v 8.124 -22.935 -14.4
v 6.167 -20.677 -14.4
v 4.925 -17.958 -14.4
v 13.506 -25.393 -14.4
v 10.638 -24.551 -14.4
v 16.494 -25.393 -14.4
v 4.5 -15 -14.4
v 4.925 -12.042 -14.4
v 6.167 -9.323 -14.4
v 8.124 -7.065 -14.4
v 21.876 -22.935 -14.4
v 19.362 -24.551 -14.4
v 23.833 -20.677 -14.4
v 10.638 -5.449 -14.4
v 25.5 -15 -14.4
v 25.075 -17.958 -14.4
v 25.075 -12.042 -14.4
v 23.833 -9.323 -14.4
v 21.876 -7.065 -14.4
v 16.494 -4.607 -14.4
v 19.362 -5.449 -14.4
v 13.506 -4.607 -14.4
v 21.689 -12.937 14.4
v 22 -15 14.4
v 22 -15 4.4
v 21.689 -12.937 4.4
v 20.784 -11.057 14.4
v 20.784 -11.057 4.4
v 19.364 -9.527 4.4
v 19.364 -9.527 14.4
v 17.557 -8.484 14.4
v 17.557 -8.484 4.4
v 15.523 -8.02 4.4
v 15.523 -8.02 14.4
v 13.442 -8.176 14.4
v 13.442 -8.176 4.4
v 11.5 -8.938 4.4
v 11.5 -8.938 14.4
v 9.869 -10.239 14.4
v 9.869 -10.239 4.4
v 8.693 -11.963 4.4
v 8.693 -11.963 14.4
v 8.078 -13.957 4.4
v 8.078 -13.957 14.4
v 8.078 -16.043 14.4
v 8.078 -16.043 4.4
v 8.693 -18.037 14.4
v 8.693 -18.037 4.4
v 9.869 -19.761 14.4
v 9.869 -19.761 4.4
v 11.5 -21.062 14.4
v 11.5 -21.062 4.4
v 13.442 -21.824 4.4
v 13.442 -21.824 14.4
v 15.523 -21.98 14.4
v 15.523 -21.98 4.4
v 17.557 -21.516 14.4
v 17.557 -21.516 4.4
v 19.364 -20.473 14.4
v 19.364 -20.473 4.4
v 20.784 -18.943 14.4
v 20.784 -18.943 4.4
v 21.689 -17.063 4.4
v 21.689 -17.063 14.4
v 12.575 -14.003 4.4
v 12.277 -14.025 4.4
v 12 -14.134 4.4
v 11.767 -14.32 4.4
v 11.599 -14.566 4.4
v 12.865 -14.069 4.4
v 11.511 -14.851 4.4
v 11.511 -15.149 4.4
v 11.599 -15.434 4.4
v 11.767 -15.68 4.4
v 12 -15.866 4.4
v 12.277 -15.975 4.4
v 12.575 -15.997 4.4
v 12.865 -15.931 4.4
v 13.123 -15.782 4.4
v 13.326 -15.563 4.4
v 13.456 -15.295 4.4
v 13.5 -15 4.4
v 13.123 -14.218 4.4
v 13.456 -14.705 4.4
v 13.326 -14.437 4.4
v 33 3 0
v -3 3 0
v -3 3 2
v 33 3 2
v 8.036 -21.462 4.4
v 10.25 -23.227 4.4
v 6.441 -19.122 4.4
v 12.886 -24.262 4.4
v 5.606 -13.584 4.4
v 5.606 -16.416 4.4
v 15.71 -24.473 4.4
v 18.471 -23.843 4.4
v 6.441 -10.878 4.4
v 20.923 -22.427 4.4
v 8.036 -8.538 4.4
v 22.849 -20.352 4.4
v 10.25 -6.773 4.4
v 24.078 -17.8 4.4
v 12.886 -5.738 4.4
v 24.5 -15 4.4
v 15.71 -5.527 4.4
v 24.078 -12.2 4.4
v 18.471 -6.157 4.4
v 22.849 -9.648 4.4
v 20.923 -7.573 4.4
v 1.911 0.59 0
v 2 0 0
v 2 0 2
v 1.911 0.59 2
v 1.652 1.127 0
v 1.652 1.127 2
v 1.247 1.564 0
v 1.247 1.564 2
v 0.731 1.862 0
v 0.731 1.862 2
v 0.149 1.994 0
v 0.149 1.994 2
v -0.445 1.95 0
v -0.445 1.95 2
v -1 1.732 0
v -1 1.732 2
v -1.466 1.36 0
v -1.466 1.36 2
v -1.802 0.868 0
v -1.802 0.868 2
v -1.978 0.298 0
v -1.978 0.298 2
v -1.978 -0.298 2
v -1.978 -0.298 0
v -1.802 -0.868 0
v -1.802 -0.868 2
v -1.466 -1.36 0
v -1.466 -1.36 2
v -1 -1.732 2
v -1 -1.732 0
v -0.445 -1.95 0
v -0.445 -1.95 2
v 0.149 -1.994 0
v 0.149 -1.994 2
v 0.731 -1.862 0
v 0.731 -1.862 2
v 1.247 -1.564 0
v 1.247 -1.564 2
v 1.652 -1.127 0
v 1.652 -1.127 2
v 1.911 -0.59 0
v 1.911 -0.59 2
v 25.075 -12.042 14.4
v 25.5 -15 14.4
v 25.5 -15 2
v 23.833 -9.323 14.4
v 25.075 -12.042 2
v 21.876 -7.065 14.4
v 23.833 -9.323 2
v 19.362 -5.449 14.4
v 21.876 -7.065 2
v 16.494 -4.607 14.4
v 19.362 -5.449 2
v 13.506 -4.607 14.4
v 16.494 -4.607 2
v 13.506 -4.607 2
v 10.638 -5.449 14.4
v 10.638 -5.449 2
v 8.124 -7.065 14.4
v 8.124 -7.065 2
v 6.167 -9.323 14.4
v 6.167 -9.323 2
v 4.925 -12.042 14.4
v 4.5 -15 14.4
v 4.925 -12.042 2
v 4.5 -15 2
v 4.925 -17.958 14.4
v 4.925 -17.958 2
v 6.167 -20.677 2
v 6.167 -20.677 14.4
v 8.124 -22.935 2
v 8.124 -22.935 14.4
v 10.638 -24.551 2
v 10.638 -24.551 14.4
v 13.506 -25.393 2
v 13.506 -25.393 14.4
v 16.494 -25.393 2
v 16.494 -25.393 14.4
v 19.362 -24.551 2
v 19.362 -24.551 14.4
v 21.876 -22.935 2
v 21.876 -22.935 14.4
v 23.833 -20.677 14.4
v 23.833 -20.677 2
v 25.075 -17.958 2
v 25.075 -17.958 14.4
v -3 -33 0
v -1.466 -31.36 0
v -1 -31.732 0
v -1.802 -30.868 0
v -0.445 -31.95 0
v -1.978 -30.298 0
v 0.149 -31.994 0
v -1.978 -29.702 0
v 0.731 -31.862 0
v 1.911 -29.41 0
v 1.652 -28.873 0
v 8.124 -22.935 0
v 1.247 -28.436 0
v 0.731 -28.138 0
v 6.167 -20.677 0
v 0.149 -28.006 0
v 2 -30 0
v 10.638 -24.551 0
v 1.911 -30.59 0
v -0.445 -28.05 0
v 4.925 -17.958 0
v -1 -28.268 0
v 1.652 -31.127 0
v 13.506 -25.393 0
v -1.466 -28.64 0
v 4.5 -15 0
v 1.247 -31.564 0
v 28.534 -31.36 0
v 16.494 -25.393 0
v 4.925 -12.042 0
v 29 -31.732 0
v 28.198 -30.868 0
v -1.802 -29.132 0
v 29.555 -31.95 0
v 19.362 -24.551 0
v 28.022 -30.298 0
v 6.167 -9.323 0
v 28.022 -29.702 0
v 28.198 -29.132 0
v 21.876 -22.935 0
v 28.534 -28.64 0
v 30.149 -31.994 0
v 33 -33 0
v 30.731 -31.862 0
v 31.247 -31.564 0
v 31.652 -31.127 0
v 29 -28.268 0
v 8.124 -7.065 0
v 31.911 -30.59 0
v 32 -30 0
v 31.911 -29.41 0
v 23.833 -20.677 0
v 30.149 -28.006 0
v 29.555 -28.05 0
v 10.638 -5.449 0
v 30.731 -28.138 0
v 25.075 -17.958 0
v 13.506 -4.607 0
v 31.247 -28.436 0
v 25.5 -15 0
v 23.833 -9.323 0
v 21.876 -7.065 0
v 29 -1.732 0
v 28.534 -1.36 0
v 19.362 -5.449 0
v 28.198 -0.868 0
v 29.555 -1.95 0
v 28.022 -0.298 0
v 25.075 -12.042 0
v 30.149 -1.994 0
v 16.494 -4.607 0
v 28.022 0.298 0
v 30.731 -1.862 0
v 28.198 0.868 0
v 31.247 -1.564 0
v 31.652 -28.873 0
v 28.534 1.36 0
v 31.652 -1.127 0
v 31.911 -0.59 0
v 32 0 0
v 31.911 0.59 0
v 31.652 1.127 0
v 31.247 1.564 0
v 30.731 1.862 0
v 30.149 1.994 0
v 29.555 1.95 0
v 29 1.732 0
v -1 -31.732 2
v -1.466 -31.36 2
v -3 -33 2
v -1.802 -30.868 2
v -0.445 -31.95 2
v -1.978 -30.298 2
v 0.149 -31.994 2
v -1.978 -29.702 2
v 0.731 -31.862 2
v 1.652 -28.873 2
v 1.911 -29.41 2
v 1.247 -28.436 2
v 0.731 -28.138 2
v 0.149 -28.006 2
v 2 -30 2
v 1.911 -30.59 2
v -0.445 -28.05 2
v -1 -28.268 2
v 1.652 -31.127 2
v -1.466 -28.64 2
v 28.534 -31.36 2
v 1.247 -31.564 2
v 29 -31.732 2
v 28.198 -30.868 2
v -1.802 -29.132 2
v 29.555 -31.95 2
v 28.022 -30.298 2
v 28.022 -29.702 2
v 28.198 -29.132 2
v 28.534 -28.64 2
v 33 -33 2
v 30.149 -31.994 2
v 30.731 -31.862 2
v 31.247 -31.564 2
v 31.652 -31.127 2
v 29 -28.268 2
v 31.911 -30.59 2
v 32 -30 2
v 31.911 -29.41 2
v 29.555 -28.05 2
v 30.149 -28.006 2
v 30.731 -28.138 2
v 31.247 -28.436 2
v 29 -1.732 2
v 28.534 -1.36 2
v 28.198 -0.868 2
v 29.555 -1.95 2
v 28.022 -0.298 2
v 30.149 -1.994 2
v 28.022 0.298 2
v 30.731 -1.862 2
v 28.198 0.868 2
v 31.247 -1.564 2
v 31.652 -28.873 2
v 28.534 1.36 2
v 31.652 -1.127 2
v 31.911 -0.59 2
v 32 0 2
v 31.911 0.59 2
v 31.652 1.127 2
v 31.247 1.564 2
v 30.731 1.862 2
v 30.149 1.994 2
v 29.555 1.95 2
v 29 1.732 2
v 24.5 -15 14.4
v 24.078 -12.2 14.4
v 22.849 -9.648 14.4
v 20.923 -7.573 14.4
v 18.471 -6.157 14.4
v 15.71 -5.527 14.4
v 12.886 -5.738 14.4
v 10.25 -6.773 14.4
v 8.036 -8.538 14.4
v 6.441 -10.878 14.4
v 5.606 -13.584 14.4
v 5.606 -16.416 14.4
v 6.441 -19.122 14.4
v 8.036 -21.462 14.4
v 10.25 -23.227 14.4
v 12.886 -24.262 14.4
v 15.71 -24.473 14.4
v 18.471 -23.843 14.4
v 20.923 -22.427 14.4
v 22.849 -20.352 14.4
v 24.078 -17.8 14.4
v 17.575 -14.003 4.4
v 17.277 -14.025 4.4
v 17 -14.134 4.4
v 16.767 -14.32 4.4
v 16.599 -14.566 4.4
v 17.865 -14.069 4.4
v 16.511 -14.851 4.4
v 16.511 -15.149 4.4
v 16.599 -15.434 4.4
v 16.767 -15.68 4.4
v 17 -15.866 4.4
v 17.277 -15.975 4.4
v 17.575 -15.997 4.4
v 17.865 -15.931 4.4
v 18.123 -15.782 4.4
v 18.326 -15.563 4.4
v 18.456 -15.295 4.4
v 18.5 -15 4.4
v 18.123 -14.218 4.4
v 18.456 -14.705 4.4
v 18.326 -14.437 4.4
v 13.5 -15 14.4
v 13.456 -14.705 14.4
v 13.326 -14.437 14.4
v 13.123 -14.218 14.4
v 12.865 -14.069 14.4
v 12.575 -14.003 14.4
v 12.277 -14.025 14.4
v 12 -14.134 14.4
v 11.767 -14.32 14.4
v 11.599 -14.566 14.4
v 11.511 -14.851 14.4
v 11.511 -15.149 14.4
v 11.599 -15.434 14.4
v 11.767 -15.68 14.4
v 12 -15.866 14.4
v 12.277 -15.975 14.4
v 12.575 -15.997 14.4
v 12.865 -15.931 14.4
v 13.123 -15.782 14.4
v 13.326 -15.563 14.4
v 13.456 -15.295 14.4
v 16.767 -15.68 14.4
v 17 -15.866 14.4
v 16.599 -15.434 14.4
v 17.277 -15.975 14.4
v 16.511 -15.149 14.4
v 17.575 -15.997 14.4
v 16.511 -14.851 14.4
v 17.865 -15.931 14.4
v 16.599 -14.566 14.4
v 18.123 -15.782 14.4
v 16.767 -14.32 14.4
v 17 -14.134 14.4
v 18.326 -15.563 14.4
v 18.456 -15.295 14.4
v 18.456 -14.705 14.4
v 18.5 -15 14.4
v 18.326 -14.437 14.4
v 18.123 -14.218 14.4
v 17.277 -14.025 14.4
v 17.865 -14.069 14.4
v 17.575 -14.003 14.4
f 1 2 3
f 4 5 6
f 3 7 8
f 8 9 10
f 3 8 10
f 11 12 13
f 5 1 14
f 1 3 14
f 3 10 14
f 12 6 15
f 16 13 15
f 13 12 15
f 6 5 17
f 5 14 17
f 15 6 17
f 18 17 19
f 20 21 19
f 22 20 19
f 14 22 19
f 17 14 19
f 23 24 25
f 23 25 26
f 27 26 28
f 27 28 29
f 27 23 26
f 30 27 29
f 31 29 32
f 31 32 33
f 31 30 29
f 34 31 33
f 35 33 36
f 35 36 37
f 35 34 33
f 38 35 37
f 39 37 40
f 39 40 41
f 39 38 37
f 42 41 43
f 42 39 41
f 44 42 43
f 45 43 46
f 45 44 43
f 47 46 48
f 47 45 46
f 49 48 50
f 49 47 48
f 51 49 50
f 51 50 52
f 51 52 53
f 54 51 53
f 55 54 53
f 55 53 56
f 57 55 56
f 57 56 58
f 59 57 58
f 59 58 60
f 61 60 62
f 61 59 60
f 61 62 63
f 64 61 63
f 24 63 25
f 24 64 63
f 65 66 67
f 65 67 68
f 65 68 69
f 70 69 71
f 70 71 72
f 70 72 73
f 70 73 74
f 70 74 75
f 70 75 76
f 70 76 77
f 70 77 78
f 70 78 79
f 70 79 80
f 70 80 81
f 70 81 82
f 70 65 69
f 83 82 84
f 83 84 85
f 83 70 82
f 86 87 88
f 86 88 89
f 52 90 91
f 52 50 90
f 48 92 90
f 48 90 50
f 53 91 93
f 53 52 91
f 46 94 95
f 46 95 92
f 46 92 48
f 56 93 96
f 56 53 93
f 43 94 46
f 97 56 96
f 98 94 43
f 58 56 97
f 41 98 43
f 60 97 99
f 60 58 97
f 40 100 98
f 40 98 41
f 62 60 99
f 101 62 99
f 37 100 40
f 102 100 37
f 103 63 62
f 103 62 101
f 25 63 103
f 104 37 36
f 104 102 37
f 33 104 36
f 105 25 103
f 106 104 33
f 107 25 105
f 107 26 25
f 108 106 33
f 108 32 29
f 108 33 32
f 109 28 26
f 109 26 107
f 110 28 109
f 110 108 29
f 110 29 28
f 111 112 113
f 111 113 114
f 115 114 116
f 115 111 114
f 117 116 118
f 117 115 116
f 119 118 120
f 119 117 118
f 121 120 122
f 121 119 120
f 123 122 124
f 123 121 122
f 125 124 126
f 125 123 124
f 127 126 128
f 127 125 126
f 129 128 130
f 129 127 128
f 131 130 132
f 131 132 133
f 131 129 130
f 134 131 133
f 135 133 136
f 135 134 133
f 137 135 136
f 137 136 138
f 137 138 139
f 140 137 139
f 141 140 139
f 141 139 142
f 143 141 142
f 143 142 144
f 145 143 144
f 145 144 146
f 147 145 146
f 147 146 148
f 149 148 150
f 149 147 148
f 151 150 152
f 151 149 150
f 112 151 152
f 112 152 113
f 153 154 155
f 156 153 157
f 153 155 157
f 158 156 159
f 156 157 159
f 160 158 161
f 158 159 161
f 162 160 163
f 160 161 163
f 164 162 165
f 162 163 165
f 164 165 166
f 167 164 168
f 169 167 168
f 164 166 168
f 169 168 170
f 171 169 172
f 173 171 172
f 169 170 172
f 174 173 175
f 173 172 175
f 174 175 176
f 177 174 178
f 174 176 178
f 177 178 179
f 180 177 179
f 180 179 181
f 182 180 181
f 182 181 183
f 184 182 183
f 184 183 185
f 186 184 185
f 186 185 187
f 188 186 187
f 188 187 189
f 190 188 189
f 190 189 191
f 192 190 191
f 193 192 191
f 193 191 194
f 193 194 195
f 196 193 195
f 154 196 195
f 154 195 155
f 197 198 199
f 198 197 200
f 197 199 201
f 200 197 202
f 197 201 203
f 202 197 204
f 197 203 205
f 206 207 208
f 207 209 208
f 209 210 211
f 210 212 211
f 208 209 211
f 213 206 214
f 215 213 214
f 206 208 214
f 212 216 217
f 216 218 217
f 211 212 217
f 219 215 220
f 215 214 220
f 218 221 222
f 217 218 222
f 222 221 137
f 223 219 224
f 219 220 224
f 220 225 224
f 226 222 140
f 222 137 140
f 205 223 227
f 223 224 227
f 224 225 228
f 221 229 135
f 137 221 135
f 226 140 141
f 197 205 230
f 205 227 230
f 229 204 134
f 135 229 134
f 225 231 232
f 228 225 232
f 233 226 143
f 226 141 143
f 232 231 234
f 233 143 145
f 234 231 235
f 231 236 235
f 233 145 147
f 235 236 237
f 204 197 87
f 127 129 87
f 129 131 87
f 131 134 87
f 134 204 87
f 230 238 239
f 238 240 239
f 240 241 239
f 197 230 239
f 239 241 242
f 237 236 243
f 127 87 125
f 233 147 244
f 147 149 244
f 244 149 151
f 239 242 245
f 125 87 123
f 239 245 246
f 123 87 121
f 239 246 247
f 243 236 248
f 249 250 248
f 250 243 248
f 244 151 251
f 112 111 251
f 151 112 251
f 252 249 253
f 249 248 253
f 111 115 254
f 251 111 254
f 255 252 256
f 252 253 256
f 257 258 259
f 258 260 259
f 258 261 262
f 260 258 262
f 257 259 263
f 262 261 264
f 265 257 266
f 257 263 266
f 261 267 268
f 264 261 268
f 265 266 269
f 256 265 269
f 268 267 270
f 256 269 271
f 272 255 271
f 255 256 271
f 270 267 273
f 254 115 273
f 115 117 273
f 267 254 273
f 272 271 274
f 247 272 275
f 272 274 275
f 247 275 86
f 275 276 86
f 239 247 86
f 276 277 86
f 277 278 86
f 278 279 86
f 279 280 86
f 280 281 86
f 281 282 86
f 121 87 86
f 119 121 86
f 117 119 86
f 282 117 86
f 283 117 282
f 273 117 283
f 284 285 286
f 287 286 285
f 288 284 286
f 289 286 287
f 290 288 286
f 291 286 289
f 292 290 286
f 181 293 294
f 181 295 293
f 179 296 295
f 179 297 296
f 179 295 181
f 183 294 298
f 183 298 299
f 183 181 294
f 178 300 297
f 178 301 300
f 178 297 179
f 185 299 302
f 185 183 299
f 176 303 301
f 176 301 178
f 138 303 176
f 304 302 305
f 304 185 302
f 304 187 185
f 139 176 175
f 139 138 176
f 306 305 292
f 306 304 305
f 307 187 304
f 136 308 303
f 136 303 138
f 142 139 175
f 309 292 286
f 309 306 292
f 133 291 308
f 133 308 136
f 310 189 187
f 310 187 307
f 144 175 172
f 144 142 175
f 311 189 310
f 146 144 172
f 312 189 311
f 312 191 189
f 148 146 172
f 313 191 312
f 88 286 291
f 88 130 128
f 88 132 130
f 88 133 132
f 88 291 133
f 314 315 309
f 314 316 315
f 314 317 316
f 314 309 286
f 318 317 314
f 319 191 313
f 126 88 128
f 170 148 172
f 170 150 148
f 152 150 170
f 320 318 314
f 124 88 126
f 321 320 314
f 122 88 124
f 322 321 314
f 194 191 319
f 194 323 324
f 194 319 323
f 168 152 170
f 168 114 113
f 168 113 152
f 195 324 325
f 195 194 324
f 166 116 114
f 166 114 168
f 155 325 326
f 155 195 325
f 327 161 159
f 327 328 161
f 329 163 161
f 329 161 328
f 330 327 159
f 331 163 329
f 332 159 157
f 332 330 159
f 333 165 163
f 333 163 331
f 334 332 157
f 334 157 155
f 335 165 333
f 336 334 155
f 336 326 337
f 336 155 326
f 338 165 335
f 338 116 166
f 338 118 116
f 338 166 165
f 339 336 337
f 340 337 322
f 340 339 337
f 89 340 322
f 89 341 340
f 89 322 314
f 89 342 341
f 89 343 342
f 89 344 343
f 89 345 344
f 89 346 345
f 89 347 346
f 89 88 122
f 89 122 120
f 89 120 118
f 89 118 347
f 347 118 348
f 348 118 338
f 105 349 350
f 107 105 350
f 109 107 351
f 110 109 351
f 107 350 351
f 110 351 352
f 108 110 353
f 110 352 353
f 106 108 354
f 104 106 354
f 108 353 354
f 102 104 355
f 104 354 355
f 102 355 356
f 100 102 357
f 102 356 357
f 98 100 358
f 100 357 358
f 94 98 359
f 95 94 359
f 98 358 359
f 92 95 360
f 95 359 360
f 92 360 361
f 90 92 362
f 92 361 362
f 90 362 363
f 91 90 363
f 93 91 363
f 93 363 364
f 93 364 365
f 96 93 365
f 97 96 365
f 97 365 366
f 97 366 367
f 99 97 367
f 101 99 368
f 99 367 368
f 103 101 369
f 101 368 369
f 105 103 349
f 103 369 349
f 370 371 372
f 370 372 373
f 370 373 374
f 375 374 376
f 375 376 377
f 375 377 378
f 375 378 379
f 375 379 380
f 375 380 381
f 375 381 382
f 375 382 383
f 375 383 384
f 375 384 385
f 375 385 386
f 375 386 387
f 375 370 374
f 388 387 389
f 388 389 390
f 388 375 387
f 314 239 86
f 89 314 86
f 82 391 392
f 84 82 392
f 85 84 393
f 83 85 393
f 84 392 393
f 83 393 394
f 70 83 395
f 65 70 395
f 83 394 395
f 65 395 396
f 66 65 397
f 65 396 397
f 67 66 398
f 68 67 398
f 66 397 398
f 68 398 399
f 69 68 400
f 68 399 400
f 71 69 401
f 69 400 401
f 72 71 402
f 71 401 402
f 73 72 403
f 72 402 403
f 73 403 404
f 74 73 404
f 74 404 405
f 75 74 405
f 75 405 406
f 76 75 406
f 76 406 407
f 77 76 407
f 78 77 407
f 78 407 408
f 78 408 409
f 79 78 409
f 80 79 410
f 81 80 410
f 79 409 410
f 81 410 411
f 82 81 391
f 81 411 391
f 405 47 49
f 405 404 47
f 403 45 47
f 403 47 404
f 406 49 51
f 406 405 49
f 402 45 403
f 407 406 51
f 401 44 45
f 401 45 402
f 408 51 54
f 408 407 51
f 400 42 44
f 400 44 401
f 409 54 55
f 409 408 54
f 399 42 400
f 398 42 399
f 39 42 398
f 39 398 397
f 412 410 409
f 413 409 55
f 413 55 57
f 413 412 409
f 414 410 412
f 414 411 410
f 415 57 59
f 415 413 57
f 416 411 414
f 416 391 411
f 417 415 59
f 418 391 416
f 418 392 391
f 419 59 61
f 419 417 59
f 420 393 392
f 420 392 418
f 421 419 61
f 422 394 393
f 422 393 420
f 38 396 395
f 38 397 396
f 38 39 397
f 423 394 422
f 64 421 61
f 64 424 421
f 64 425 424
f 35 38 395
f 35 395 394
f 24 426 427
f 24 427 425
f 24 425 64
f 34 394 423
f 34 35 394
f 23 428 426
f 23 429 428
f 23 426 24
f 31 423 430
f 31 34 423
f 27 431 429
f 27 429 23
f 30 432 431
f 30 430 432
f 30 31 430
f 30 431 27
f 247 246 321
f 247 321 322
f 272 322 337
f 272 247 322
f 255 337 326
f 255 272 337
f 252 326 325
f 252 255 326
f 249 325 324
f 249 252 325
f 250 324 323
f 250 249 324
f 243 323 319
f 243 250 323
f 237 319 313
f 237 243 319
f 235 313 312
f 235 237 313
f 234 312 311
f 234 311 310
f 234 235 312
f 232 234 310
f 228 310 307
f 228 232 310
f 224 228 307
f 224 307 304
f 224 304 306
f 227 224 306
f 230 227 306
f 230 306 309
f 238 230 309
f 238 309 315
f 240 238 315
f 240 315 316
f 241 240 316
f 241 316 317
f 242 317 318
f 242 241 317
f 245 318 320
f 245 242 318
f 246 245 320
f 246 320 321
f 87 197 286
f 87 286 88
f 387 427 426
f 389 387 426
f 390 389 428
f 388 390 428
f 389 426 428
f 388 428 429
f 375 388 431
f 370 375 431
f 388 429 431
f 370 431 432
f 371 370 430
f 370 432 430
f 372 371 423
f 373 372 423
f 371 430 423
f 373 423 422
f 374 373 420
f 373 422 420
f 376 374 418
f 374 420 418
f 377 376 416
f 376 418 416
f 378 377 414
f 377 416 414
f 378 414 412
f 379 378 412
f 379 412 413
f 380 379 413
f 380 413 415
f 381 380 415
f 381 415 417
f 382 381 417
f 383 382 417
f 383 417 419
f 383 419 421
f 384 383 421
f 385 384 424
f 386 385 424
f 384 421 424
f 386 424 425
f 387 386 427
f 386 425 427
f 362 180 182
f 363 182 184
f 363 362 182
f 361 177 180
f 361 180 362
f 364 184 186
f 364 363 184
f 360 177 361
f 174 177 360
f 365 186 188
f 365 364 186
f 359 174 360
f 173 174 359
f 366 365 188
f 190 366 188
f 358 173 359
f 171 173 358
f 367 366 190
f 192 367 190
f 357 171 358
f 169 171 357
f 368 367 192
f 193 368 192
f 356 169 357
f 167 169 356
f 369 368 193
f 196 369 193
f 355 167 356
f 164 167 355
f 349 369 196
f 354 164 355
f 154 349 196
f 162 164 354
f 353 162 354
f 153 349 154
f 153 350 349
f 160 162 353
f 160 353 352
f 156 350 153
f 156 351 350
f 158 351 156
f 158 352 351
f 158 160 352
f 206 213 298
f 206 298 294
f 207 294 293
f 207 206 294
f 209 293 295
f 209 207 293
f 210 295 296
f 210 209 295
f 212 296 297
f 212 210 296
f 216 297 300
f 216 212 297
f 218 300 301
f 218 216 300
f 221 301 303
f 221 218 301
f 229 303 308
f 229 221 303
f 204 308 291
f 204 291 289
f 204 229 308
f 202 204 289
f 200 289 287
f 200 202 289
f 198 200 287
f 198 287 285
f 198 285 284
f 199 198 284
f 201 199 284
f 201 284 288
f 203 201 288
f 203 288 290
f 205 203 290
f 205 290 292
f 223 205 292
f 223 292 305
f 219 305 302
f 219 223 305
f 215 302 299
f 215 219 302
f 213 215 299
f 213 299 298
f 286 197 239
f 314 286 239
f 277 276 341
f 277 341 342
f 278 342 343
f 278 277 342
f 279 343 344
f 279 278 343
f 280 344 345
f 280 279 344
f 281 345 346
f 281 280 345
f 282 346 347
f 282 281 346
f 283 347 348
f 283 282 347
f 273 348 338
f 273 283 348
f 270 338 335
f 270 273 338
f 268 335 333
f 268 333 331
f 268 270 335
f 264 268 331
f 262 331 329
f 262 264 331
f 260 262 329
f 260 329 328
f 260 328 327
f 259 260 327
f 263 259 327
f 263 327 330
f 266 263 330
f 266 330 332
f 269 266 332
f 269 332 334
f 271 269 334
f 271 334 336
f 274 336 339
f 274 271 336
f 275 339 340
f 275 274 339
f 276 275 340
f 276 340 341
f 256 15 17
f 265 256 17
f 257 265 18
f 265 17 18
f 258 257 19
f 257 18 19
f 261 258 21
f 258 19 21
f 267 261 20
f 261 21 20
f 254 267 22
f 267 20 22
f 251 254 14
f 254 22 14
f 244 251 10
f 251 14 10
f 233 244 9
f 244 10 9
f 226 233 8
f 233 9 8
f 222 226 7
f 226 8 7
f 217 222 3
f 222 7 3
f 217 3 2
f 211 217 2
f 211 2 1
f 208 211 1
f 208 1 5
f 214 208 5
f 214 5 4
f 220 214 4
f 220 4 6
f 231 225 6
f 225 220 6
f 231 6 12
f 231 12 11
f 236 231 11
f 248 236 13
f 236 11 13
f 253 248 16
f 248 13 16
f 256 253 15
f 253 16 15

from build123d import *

# Parameters (mm, degrees)
SKETCH_1_W           = 36
SKETCH_1_H           = 36
SKETCH_1_R           = 2
EXTRUDE_1_DEPTH      = 2
EXTRUDE_2_DEPTH      = 12.4
EXTRUDE_2_DEPTH_BACK = 16.4
SKETCH_2_R           = 10.5
SKETCH_3_R           = 9.5
SKETCH_3_R_2         = 7
SKETCH_3_R_3         = 1
CUT_EXTRUDE_1_DEPTH  = 10


with BuildPart() as part:
    # 草图1 → 凸台-拉伸1 (new body)
    with BuildSketch(Plane.XY):
        with Locations((15, -15)):
            Rectangle(SKETCH_1_W, SKETCH_1_H)
        Circle(SKETCH_1_R, mode=Mode.SUBTRACT)
        with Locations((0, -30)):
            Circle(SKETCH_1_R, mode=Mode.SUBTRACT)
        with Locations((30, -30)):
            Circle(SKETCH_1_R, mode=Mode.SUBTRACT)
        with Locations((30, 0)):
            Circle(SKETCH_1_R, mode=Mode.SUBTRACT)
    extrude(amount=EXTRUDE_1_DEPTH)

    # 草图2 → 凸台-拉伸2 (add, two sides: drawn at the far end of the back side and taken through both)
    with BuildSketch(Plane.XY.offset(2).offset(-EXTRUDE_2_DEPTH_BACK)):
        with Locations((15, -15)):
            Circle(SKETCH_2_R)
    extrude(amount=EXTRUDE_2_DEPTH + EXTRUDE_2_DEPTH_BACK)

    # 草图3 → 切除-拉伸1 (cut)
    # profile 1 of 3: a face of its own
    with BuildSketch(Plane.XY.offset(14.4)):
        with Locations((15, -15)):
            Circle(SKETCH_3_R)
        with Locations((15, -15)):
            Circle(SKETCH_3_R_2, mode=Mode.SUBTRACT)
    # profile 2 of 3: a face of its own
    with BuildSketch(Plane.XY.offset(14.4)):
        with Locations((17.5, -15)):
            Circle(SKETCH_3_R_3)
    # profile 3 of 3: a face of its own
    with BuildSketch(Plane.XY.offset(14.4)):
        with Locations((12.5, -15)):
            Circle(SKETCH_3_R_3)
    extrude(amount=-CUT_EXTRUDE_1_DEPTH, mode=Mode.SUBTRACT)


solid = part.part
